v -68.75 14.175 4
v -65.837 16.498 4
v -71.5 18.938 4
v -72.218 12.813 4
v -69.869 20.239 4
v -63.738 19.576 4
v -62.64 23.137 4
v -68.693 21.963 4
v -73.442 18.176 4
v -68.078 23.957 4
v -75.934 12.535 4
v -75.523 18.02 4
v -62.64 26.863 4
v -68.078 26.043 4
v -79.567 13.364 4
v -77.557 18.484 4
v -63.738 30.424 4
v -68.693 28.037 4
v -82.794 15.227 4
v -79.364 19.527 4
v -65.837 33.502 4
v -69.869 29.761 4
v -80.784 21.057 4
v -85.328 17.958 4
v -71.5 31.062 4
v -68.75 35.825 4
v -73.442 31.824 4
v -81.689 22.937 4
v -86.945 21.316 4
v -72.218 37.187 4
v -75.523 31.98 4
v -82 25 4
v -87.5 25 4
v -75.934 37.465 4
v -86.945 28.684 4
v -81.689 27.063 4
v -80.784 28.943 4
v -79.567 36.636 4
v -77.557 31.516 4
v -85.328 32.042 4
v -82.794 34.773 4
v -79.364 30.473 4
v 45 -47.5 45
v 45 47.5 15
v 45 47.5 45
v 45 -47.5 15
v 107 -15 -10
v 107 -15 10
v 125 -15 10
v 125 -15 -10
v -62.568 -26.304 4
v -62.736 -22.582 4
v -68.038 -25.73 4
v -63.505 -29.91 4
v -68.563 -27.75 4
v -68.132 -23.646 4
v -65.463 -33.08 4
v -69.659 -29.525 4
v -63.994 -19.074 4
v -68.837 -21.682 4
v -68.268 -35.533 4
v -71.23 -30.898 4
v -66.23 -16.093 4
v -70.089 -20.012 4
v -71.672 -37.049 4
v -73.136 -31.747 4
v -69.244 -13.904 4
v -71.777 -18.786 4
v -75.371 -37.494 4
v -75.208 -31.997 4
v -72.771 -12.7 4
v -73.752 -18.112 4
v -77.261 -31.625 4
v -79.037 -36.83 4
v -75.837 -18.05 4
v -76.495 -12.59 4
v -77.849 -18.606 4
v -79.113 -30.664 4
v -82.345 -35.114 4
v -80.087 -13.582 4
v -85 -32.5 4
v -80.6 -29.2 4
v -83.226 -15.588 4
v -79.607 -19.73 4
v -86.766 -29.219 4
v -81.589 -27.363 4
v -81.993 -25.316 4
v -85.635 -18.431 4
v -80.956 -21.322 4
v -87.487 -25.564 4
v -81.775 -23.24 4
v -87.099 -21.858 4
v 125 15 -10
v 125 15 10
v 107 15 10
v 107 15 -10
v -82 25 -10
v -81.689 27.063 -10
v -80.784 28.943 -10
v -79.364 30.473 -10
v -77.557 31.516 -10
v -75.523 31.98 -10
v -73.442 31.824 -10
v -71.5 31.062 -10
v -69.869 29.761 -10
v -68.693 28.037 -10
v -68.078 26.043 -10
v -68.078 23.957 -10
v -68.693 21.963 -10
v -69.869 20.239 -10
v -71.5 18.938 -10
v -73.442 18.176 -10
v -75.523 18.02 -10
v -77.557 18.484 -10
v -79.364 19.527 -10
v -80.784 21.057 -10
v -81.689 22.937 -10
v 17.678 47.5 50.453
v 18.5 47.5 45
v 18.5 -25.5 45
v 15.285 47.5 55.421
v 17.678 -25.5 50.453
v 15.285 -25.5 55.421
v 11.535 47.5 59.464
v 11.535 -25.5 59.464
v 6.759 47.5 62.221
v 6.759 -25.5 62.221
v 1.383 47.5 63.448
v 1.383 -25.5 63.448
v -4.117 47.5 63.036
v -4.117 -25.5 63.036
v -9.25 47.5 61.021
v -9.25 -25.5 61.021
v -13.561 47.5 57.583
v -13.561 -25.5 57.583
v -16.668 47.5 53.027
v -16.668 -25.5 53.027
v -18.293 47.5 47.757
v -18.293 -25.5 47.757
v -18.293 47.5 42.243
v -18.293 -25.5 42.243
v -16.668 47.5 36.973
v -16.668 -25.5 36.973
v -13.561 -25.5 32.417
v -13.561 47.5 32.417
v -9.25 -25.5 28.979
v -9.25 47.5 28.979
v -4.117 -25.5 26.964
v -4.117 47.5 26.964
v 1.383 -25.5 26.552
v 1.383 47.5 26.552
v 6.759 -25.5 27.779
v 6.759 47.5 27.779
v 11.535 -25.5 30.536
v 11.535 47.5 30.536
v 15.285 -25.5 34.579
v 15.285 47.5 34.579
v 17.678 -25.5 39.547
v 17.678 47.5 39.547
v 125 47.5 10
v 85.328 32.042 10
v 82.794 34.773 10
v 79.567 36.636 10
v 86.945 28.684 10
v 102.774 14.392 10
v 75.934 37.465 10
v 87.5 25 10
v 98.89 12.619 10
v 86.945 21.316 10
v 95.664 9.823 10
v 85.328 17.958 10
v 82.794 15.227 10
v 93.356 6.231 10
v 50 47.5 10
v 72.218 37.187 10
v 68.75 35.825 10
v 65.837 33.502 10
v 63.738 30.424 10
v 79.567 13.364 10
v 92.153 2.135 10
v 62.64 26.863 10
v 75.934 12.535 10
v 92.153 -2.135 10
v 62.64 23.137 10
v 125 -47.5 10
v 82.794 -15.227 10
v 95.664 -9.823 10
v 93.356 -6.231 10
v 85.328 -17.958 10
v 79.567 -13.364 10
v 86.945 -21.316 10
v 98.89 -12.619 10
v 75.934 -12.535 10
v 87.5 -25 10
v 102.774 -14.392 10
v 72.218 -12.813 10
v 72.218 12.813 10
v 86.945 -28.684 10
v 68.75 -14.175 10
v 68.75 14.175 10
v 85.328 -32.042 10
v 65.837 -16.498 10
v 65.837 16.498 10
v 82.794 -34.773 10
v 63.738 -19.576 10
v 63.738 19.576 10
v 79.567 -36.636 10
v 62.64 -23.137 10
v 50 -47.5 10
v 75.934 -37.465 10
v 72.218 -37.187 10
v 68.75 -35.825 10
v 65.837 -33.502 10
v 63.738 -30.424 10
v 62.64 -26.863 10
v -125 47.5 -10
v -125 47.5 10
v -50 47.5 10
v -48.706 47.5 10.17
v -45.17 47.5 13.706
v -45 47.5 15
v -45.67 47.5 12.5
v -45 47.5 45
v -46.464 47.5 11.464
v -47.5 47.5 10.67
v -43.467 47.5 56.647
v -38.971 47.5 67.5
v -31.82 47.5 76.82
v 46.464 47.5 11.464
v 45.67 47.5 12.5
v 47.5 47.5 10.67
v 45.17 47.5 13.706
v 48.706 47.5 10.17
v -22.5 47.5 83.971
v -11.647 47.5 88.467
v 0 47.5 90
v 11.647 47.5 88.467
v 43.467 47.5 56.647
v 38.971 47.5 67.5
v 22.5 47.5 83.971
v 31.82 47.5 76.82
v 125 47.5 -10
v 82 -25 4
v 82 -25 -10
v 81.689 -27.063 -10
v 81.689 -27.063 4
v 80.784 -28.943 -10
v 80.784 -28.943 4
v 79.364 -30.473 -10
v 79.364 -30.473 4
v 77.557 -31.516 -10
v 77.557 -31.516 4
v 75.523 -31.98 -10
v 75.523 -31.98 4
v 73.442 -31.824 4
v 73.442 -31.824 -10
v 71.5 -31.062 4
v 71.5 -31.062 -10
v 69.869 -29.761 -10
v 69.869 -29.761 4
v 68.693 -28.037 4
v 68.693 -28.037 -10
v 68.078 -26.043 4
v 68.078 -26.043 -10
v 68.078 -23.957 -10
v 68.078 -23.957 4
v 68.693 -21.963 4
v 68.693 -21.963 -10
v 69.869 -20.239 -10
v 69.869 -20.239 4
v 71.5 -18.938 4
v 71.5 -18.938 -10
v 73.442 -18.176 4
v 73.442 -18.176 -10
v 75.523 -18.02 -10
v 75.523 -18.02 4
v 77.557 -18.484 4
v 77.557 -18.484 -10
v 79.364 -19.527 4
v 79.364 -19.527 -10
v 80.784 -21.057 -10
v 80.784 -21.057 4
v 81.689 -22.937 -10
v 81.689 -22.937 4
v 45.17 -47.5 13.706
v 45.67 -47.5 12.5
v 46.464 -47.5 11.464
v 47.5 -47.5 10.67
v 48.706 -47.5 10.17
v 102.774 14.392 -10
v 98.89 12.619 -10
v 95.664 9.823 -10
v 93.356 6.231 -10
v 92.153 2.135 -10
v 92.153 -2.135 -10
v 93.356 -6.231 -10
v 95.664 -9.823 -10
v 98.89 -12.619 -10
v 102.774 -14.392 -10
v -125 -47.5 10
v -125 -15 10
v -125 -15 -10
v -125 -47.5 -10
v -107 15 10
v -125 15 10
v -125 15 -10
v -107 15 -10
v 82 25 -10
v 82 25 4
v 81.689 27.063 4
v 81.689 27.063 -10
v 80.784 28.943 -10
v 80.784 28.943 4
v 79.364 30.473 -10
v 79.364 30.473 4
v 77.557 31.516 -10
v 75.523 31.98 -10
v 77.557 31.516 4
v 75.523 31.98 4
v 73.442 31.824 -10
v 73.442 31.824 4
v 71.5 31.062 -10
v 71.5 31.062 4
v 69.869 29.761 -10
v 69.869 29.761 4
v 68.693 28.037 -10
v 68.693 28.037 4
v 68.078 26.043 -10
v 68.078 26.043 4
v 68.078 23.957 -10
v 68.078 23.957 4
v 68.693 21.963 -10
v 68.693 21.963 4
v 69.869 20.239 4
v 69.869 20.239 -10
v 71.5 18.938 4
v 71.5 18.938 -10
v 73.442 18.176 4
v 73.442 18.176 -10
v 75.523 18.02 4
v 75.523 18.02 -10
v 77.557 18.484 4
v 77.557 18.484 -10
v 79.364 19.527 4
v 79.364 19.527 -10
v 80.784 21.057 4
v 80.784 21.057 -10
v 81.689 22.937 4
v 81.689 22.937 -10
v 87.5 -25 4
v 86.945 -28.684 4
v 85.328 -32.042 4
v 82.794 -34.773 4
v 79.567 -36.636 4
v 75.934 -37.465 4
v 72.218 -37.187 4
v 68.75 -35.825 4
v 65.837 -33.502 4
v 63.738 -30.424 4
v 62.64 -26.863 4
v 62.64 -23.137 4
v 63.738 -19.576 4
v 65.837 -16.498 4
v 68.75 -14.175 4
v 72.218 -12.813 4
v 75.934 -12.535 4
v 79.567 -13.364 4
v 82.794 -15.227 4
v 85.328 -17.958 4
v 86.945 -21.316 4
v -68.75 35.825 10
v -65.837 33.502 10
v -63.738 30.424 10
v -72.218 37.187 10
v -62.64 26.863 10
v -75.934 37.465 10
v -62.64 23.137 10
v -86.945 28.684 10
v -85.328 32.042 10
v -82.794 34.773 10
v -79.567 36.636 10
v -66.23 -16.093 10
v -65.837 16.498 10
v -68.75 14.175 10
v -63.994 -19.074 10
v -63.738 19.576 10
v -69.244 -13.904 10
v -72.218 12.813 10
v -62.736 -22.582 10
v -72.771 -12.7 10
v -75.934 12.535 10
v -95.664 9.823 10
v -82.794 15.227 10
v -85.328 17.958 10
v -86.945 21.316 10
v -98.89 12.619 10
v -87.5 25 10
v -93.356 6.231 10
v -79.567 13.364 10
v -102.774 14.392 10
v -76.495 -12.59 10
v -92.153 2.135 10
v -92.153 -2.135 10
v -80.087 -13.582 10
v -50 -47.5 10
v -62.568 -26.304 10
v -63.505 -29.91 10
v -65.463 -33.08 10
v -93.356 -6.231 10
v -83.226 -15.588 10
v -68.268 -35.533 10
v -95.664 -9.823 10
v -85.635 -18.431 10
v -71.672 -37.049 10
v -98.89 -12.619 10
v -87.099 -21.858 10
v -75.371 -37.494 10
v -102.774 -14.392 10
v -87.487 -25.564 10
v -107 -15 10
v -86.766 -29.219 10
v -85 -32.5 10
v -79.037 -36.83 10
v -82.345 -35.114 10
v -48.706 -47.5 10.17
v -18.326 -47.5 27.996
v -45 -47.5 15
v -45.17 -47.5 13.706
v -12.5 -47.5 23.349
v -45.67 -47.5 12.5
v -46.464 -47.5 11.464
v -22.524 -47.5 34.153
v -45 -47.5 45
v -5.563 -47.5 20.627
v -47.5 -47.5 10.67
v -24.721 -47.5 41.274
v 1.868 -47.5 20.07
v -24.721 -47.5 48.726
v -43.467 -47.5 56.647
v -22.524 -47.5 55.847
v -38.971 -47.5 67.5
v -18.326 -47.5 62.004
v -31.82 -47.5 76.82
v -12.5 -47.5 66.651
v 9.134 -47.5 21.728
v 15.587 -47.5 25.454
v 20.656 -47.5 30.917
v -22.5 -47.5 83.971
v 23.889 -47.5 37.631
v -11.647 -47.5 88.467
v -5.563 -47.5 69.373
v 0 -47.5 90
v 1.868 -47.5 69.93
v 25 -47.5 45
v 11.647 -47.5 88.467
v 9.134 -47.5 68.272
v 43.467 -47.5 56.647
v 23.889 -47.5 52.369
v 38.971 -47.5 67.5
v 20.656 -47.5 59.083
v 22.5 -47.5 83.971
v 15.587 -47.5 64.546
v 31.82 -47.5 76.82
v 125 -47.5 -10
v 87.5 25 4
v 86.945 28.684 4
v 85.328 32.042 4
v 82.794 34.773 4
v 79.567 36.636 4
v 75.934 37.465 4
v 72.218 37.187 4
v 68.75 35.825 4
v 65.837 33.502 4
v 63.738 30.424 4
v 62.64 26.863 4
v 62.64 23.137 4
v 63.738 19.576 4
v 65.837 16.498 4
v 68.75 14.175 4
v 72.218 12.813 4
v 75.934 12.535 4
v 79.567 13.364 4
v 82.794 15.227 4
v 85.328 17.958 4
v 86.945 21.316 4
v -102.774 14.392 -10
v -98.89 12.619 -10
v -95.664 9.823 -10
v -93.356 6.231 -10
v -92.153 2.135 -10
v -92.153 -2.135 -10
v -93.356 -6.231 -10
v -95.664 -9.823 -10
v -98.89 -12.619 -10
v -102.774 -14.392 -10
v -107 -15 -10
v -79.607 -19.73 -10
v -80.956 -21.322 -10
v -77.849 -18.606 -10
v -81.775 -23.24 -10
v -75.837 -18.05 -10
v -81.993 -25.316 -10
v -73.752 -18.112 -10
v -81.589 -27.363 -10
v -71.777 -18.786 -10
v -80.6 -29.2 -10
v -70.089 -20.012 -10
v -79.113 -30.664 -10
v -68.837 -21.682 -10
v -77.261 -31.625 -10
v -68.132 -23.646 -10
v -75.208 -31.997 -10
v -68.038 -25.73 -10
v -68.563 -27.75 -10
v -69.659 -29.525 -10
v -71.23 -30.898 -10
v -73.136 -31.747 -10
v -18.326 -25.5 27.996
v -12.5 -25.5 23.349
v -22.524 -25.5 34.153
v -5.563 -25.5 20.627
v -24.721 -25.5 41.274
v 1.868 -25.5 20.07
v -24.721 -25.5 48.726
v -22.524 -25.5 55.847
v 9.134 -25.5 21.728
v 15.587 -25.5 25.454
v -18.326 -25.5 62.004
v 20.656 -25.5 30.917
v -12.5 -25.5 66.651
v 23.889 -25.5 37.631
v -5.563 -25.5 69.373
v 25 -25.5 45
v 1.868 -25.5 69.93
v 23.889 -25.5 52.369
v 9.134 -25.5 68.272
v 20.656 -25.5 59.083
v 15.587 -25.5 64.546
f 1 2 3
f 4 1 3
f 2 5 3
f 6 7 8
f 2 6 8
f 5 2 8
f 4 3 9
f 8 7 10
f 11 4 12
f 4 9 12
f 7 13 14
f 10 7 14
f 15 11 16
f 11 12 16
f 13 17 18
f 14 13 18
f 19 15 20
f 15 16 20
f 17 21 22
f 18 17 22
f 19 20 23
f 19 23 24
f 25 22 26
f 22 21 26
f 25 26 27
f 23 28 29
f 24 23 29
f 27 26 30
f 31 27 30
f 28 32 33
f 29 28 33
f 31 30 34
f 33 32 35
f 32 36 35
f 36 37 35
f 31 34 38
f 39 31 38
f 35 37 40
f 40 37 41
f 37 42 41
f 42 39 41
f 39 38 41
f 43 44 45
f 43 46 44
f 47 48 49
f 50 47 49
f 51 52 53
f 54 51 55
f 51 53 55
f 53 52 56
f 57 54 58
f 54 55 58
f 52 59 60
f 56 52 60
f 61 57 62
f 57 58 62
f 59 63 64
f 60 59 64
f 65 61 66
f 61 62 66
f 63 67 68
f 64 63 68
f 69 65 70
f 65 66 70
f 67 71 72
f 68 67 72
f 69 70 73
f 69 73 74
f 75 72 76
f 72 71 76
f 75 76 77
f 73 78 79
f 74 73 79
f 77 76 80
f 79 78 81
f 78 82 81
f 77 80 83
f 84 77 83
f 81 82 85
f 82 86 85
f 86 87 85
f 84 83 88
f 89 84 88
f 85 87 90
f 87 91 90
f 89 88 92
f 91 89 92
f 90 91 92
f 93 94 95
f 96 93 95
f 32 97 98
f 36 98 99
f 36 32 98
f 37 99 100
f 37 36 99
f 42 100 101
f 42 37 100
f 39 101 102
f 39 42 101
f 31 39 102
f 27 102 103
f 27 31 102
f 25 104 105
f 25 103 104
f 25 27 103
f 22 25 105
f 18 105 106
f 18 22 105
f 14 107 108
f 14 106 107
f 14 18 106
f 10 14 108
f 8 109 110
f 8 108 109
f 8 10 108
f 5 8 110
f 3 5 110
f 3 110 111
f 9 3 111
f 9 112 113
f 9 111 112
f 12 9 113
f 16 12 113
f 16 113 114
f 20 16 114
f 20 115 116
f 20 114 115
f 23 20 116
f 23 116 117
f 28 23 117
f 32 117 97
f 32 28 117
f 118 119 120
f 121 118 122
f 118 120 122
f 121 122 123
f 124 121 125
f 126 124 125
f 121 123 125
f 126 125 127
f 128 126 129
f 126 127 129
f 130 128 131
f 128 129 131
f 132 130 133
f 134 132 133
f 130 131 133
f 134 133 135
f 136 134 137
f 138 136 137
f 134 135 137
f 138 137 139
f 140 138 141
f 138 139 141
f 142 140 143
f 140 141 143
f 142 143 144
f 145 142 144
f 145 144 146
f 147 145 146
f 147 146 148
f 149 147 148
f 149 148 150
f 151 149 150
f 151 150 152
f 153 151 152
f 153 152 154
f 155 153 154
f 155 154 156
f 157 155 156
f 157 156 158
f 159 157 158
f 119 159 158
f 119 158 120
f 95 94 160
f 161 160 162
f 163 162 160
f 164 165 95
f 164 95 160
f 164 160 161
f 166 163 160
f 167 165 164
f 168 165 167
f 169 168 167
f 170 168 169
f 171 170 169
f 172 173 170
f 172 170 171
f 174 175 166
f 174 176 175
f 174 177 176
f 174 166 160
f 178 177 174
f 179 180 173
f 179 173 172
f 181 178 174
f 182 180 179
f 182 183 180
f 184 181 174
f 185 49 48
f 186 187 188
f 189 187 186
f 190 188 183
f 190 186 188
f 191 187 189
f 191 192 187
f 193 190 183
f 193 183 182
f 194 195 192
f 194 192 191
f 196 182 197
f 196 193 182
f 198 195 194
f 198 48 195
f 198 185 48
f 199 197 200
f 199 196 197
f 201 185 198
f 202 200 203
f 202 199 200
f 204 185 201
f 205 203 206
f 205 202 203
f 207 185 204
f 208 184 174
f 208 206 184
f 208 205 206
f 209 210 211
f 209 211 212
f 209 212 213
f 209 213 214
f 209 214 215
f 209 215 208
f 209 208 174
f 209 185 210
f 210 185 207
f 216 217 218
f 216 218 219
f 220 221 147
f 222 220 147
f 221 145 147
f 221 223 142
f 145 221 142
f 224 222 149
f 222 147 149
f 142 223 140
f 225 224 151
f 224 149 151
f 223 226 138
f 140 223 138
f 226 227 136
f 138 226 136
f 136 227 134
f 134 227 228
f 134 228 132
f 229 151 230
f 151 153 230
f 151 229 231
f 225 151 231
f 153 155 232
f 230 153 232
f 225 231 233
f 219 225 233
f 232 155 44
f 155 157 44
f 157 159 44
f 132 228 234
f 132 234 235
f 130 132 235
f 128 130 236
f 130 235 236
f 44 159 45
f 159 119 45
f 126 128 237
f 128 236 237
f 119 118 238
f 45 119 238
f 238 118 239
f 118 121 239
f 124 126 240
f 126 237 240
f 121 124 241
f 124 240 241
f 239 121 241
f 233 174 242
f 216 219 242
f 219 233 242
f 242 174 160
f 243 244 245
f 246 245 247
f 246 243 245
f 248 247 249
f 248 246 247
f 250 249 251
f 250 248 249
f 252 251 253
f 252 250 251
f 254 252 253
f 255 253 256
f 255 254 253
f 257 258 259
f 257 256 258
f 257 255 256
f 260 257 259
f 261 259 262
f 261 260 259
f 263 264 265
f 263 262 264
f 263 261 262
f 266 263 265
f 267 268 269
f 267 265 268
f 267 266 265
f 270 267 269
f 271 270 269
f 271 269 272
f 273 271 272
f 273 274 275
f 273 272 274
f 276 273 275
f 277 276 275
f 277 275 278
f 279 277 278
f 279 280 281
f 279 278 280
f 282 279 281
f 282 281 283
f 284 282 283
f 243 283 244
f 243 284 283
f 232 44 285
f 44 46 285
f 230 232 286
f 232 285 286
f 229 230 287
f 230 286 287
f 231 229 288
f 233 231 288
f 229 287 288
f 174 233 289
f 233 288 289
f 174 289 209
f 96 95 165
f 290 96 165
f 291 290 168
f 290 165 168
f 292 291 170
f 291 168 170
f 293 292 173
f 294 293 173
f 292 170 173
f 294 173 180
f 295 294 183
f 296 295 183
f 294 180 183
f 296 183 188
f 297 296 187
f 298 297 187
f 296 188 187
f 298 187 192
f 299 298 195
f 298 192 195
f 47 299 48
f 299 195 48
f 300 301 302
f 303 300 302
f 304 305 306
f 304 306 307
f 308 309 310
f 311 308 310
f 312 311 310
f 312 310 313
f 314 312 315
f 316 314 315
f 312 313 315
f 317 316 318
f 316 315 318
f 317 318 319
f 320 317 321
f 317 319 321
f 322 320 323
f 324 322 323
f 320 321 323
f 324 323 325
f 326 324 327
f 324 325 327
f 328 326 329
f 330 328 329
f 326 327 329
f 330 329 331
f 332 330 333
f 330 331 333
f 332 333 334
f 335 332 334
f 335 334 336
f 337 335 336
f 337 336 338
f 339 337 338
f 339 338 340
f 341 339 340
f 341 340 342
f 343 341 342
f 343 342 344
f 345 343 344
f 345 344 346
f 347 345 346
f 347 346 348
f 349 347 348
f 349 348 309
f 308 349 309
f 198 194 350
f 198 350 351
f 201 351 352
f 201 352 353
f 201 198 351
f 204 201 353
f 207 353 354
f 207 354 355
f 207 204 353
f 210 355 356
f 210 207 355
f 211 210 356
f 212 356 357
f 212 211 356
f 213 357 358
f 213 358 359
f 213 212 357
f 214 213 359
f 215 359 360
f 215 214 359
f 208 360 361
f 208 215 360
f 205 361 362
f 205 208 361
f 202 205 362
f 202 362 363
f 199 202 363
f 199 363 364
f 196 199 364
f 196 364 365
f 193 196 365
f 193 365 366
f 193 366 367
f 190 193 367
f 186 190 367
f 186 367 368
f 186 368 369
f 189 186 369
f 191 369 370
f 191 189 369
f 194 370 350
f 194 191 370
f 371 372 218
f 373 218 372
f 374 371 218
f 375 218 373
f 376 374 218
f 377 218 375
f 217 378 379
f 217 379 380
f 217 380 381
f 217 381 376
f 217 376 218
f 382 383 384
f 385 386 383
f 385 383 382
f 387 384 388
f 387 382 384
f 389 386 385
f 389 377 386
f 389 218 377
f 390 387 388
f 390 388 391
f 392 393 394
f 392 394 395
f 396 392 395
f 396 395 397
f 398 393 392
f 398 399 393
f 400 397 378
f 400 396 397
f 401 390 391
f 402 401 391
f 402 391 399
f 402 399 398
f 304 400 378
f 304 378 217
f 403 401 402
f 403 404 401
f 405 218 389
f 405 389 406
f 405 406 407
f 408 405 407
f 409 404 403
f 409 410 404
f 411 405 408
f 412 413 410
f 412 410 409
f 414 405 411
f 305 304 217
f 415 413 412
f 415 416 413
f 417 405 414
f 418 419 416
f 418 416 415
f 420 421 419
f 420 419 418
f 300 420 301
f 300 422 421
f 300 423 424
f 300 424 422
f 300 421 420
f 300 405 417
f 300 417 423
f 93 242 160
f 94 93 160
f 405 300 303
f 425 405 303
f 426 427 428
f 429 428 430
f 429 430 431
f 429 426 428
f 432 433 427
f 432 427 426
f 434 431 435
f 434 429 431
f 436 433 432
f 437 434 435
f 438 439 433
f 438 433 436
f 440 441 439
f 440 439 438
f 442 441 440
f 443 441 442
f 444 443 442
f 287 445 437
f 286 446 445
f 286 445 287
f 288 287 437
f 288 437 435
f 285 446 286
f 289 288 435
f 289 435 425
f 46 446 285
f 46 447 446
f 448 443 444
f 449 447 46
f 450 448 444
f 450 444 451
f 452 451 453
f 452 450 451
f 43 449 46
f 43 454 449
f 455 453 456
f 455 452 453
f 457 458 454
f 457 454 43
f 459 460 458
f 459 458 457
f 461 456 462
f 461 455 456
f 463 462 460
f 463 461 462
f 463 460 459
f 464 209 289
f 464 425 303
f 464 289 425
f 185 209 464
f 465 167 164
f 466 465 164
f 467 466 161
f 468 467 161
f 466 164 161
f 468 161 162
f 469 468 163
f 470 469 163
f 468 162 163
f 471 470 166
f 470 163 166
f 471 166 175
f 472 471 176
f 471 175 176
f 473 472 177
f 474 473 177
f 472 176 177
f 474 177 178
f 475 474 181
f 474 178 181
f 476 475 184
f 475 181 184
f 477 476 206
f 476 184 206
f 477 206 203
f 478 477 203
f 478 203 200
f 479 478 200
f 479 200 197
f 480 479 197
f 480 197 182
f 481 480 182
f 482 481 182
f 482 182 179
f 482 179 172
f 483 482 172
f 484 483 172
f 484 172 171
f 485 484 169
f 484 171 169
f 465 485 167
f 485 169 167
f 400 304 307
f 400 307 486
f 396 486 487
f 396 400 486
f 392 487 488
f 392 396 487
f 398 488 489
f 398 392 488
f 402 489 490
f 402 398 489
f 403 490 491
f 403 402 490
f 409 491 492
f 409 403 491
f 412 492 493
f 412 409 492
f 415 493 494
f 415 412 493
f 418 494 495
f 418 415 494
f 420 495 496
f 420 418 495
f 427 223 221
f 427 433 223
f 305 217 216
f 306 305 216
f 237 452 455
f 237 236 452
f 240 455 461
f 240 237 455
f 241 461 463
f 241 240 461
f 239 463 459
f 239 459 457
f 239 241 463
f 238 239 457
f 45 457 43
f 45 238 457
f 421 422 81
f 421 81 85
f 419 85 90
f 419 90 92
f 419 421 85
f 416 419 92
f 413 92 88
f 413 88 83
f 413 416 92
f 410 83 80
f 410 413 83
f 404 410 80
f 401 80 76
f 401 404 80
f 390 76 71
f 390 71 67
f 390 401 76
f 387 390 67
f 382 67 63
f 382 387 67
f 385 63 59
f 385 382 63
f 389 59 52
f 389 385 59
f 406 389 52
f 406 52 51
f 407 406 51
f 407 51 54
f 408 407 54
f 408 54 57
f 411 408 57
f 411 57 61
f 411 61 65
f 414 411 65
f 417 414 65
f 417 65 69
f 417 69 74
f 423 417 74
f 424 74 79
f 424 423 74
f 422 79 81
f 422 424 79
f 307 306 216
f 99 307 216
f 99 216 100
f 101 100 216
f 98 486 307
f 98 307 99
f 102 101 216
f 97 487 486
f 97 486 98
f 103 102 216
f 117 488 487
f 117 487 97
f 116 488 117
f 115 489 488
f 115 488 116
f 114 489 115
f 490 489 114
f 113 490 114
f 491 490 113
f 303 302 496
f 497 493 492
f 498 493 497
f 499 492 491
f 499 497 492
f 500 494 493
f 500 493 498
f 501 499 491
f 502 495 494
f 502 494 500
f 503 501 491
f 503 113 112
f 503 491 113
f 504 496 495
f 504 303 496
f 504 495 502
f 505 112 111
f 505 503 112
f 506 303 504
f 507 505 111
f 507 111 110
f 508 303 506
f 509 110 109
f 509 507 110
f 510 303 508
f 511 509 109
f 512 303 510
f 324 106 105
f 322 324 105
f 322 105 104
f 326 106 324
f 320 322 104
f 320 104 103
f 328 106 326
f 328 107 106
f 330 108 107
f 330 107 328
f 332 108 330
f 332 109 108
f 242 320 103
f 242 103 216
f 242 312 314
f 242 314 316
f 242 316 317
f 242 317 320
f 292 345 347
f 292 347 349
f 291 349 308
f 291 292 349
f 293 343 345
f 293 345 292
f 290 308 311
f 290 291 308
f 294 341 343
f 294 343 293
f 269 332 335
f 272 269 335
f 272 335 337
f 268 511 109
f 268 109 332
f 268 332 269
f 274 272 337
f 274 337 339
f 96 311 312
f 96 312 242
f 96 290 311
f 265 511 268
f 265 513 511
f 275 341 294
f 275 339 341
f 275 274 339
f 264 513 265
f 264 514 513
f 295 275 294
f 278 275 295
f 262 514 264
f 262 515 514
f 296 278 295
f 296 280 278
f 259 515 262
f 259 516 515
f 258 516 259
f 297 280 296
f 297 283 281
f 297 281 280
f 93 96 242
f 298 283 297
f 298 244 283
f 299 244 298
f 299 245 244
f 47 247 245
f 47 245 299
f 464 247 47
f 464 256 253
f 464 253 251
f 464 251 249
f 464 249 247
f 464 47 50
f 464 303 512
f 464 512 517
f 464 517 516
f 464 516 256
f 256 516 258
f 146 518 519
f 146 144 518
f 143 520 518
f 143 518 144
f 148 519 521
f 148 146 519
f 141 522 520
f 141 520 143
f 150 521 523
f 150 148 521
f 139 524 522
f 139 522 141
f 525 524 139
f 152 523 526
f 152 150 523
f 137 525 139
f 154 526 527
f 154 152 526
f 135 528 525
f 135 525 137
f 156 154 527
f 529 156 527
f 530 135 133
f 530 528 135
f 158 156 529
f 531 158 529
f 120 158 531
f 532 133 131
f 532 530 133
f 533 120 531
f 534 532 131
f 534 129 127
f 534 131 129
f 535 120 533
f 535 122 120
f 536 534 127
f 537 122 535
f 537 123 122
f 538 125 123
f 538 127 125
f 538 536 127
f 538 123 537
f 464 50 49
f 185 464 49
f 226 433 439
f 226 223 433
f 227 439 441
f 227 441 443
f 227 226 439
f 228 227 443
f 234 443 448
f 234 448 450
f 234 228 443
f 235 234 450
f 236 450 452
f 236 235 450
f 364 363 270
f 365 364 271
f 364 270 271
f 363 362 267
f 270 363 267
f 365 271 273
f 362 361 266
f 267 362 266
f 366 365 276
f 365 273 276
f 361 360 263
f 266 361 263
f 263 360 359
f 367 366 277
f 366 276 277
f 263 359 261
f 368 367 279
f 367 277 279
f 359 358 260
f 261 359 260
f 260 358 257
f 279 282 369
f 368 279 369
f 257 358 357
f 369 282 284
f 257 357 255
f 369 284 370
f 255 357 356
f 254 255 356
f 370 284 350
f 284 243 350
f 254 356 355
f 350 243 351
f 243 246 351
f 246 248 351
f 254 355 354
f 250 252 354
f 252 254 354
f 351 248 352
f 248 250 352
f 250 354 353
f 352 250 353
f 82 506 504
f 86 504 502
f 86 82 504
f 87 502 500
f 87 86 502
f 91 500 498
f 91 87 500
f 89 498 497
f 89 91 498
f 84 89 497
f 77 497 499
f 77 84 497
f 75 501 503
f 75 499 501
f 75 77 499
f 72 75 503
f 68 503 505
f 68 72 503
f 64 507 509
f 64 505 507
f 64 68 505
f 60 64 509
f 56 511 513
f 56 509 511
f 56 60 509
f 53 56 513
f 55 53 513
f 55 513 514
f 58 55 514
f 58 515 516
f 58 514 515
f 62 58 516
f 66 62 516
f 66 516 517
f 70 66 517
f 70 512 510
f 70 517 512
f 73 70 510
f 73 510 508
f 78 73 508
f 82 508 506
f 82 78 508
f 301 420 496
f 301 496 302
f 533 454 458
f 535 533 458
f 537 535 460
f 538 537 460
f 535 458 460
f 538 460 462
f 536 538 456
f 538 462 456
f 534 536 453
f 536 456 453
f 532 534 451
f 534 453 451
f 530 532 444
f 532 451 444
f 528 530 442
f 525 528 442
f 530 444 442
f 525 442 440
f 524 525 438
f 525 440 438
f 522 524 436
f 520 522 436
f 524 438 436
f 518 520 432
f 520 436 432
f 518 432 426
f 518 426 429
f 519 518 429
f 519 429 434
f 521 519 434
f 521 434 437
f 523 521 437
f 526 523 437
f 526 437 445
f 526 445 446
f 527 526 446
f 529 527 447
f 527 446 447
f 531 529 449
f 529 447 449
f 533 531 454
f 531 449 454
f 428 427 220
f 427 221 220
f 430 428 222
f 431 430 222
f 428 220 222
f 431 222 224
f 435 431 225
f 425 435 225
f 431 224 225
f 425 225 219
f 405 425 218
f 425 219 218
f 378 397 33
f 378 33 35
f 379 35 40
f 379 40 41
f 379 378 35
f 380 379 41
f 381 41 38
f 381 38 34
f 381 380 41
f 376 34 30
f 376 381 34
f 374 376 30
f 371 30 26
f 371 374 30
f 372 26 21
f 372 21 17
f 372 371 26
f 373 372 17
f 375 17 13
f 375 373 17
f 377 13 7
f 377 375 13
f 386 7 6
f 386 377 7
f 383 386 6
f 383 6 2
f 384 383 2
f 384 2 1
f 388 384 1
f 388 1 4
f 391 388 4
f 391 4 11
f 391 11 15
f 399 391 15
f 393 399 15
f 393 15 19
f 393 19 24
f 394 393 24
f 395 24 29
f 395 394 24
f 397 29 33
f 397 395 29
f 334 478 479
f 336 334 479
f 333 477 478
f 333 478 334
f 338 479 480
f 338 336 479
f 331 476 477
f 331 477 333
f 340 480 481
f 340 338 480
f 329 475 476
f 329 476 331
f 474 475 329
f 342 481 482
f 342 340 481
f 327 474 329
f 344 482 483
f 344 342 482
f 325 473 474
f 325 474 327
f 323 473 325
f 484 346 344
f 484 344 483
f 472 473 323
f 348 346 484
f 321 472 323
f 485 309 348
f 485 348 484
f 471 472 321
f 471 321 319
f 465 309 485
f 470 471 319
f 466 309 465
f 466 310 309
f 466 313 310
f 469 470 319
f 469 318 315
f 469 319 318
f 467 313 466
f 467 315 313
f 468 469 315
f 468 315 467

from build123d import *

# Parameters (mm, degrees)
F1_DEPTH  = 47.5
F2_R      = 44.99999
F3_R      = 5
F4_R      = 18.5
F5_DEPTH  = 95.001
F4_R_2    = 25
F6_DEPTH  = 22
F8_DEPTH  = 20.001
F7_R      = 12.5
F7_R_2    = 7
F9_DEPTH  = 6
F10_DEPTH = 20.001


# Not quite as in the source:
# - a fillet or chamfer is up to 0.001 mm smaller than in the source, because OpenCascade refuses the exact size
# - a pattern or mirror of a feature is missing from the dataset's text; its kind, count and spacing are read off the source's solid


with BuildPart() as f1:
    # F0 (on Front) → F1 (new body, symmetric)
    with BuildSketch(Plane.XZ):
        Polygon((-45, 10), (-125, 10), (-125, -10), (125, -10), (125, 10), (45, 10), (45, 90), (-45, 90), align=None)
    extrude(amount=F1_DEPTH, both=True)

    # F2 (radius 45 in the source; OpenCascade refuses exactly that, so slightly less here)
    f2_edges = [f1.edges().sort_by_distance(p)[0] for p in [
        (45, 0, 90),
        (-45, 0, 90),
    ]]
    fillet(f2_edges, radius=F2_R)

    # F3
    f3_edges = [f1.edges().sort_by_distance(p)[0] for p in [
        (45, 0, 10),
        (-45, 0, 10),
    ]]
    fillet(f3_edges, radius=F3_R)

    # F4 (on face) → F5 (cut, through all)
    with BuildSketch(Plane.XZ.offset(47.5)):
        with Locations((0, 45)):
            Circle(F4_R)
    extrude(amount=-F5_DEPTH, mode=Mode.SUBTRACT)

    # F4 (on face) → F6 (cut)
    with BuildSketch(Plane.XZ.offset(47.5)):
        with Locations((0, 45)):
            Circle(F4_R_2)
        with Locations((0, 45)):
            Circle(F4_R, mode=Mode.SUBTRACT)
    extrude(amount=-F6_DEPTH, mode=Mode.SUBTRACT)

    # F7 (on face) → F8 (cut, through all)
    with BuildSketch(Plane.XY.offset(10)):
        with BuildLine():
            Line((125, -15), (125, 15))
            Line((125, 15), (107, 15))
            ThreePointArc((107, 15), (92, 0), (107, -15))
            Line((107, -15), (125, -15))
        make_face()
    f8 = extrude(amount=-F8_DEPTH, mode=Mode.SUBTRACT)

    # F8_copies: F8 across plane
    add(f8.mirror(Plane(origin=(0, 0, 0), x_dir=(0, 0, -1), z_dir=(-1, 0, 0))), mode=Mode.SUBTRACT)

    # F7 (on face) → F9 (cut)
    with BuildSketch(Plane.XY.offset(10)):
        with Locations((75, 25)):
            Circle(F7_R)
        with Locations((75, 25)):
            Circle(F7_R_2, mode=Mode.SUBTRACT)
    f9 = extrude(amount=-F9_DEPTH, mode=Mode.SUBTRACT)

    # F9_copies: F9 across plane
    add(f9.mirror(Plane(origin=(0, 0, 0), x_dir=(0, 0, -1), z_dir=(-1, 0, 0))), mode=Mode.SUBTRACT)

    # F9_copies1: F9 across plane
    add(f9.mirror(Plane(origin=(0, 0, 0), x_dir=(0, 0, -1), z_dir=(0, -1, 0))), mode=Mode.SUBTRACT)

    # F9_copies2: F9 across plane
    add(f9.mirror(Plane(origin=(0, 0, 0), x_dir=(0.316227766, -0.9486832981, 0), z_dir=(-0.9486832981, -0.316227766, 0))), mode=Mode.SUBTRACT)

    # F7 (on face) → F10 (cut, through all)
    with BuildSketch(Plane.XY.offset(10)):
        with Locations((75, 25)):
            Circle(F7_R_2)
    f10 = extrude(amount=-F10_DEPTH, mode=Mode.SUBTRACT)

    # F10_copies: F10 across plane
    add(f10.mirror(Plane(origin=(0, 0, 0), x_dir=(0, 0, -1), z_dir=(0, -1, 0))), mode=Mode.SUBTRACT)

    # F10_copies1: F10 across plane
    add(f10.mirror(Plane(origin=(0, 0, 0), x_dir=(0, 0, -1), z_dir=(-1, 0, 0))), mode=Mode.SUBTRACT)

    # F10_copies2: F10 across plane
    add(f10.mirror(Plane(origin=(0, 0, 0), x_dir=(0.316227766, -0.9486832981, 0), z_dir=(-0.9486832981, -0.316227766, 0))), mode=Mode.SUBTRACT)


solid = f1.part
